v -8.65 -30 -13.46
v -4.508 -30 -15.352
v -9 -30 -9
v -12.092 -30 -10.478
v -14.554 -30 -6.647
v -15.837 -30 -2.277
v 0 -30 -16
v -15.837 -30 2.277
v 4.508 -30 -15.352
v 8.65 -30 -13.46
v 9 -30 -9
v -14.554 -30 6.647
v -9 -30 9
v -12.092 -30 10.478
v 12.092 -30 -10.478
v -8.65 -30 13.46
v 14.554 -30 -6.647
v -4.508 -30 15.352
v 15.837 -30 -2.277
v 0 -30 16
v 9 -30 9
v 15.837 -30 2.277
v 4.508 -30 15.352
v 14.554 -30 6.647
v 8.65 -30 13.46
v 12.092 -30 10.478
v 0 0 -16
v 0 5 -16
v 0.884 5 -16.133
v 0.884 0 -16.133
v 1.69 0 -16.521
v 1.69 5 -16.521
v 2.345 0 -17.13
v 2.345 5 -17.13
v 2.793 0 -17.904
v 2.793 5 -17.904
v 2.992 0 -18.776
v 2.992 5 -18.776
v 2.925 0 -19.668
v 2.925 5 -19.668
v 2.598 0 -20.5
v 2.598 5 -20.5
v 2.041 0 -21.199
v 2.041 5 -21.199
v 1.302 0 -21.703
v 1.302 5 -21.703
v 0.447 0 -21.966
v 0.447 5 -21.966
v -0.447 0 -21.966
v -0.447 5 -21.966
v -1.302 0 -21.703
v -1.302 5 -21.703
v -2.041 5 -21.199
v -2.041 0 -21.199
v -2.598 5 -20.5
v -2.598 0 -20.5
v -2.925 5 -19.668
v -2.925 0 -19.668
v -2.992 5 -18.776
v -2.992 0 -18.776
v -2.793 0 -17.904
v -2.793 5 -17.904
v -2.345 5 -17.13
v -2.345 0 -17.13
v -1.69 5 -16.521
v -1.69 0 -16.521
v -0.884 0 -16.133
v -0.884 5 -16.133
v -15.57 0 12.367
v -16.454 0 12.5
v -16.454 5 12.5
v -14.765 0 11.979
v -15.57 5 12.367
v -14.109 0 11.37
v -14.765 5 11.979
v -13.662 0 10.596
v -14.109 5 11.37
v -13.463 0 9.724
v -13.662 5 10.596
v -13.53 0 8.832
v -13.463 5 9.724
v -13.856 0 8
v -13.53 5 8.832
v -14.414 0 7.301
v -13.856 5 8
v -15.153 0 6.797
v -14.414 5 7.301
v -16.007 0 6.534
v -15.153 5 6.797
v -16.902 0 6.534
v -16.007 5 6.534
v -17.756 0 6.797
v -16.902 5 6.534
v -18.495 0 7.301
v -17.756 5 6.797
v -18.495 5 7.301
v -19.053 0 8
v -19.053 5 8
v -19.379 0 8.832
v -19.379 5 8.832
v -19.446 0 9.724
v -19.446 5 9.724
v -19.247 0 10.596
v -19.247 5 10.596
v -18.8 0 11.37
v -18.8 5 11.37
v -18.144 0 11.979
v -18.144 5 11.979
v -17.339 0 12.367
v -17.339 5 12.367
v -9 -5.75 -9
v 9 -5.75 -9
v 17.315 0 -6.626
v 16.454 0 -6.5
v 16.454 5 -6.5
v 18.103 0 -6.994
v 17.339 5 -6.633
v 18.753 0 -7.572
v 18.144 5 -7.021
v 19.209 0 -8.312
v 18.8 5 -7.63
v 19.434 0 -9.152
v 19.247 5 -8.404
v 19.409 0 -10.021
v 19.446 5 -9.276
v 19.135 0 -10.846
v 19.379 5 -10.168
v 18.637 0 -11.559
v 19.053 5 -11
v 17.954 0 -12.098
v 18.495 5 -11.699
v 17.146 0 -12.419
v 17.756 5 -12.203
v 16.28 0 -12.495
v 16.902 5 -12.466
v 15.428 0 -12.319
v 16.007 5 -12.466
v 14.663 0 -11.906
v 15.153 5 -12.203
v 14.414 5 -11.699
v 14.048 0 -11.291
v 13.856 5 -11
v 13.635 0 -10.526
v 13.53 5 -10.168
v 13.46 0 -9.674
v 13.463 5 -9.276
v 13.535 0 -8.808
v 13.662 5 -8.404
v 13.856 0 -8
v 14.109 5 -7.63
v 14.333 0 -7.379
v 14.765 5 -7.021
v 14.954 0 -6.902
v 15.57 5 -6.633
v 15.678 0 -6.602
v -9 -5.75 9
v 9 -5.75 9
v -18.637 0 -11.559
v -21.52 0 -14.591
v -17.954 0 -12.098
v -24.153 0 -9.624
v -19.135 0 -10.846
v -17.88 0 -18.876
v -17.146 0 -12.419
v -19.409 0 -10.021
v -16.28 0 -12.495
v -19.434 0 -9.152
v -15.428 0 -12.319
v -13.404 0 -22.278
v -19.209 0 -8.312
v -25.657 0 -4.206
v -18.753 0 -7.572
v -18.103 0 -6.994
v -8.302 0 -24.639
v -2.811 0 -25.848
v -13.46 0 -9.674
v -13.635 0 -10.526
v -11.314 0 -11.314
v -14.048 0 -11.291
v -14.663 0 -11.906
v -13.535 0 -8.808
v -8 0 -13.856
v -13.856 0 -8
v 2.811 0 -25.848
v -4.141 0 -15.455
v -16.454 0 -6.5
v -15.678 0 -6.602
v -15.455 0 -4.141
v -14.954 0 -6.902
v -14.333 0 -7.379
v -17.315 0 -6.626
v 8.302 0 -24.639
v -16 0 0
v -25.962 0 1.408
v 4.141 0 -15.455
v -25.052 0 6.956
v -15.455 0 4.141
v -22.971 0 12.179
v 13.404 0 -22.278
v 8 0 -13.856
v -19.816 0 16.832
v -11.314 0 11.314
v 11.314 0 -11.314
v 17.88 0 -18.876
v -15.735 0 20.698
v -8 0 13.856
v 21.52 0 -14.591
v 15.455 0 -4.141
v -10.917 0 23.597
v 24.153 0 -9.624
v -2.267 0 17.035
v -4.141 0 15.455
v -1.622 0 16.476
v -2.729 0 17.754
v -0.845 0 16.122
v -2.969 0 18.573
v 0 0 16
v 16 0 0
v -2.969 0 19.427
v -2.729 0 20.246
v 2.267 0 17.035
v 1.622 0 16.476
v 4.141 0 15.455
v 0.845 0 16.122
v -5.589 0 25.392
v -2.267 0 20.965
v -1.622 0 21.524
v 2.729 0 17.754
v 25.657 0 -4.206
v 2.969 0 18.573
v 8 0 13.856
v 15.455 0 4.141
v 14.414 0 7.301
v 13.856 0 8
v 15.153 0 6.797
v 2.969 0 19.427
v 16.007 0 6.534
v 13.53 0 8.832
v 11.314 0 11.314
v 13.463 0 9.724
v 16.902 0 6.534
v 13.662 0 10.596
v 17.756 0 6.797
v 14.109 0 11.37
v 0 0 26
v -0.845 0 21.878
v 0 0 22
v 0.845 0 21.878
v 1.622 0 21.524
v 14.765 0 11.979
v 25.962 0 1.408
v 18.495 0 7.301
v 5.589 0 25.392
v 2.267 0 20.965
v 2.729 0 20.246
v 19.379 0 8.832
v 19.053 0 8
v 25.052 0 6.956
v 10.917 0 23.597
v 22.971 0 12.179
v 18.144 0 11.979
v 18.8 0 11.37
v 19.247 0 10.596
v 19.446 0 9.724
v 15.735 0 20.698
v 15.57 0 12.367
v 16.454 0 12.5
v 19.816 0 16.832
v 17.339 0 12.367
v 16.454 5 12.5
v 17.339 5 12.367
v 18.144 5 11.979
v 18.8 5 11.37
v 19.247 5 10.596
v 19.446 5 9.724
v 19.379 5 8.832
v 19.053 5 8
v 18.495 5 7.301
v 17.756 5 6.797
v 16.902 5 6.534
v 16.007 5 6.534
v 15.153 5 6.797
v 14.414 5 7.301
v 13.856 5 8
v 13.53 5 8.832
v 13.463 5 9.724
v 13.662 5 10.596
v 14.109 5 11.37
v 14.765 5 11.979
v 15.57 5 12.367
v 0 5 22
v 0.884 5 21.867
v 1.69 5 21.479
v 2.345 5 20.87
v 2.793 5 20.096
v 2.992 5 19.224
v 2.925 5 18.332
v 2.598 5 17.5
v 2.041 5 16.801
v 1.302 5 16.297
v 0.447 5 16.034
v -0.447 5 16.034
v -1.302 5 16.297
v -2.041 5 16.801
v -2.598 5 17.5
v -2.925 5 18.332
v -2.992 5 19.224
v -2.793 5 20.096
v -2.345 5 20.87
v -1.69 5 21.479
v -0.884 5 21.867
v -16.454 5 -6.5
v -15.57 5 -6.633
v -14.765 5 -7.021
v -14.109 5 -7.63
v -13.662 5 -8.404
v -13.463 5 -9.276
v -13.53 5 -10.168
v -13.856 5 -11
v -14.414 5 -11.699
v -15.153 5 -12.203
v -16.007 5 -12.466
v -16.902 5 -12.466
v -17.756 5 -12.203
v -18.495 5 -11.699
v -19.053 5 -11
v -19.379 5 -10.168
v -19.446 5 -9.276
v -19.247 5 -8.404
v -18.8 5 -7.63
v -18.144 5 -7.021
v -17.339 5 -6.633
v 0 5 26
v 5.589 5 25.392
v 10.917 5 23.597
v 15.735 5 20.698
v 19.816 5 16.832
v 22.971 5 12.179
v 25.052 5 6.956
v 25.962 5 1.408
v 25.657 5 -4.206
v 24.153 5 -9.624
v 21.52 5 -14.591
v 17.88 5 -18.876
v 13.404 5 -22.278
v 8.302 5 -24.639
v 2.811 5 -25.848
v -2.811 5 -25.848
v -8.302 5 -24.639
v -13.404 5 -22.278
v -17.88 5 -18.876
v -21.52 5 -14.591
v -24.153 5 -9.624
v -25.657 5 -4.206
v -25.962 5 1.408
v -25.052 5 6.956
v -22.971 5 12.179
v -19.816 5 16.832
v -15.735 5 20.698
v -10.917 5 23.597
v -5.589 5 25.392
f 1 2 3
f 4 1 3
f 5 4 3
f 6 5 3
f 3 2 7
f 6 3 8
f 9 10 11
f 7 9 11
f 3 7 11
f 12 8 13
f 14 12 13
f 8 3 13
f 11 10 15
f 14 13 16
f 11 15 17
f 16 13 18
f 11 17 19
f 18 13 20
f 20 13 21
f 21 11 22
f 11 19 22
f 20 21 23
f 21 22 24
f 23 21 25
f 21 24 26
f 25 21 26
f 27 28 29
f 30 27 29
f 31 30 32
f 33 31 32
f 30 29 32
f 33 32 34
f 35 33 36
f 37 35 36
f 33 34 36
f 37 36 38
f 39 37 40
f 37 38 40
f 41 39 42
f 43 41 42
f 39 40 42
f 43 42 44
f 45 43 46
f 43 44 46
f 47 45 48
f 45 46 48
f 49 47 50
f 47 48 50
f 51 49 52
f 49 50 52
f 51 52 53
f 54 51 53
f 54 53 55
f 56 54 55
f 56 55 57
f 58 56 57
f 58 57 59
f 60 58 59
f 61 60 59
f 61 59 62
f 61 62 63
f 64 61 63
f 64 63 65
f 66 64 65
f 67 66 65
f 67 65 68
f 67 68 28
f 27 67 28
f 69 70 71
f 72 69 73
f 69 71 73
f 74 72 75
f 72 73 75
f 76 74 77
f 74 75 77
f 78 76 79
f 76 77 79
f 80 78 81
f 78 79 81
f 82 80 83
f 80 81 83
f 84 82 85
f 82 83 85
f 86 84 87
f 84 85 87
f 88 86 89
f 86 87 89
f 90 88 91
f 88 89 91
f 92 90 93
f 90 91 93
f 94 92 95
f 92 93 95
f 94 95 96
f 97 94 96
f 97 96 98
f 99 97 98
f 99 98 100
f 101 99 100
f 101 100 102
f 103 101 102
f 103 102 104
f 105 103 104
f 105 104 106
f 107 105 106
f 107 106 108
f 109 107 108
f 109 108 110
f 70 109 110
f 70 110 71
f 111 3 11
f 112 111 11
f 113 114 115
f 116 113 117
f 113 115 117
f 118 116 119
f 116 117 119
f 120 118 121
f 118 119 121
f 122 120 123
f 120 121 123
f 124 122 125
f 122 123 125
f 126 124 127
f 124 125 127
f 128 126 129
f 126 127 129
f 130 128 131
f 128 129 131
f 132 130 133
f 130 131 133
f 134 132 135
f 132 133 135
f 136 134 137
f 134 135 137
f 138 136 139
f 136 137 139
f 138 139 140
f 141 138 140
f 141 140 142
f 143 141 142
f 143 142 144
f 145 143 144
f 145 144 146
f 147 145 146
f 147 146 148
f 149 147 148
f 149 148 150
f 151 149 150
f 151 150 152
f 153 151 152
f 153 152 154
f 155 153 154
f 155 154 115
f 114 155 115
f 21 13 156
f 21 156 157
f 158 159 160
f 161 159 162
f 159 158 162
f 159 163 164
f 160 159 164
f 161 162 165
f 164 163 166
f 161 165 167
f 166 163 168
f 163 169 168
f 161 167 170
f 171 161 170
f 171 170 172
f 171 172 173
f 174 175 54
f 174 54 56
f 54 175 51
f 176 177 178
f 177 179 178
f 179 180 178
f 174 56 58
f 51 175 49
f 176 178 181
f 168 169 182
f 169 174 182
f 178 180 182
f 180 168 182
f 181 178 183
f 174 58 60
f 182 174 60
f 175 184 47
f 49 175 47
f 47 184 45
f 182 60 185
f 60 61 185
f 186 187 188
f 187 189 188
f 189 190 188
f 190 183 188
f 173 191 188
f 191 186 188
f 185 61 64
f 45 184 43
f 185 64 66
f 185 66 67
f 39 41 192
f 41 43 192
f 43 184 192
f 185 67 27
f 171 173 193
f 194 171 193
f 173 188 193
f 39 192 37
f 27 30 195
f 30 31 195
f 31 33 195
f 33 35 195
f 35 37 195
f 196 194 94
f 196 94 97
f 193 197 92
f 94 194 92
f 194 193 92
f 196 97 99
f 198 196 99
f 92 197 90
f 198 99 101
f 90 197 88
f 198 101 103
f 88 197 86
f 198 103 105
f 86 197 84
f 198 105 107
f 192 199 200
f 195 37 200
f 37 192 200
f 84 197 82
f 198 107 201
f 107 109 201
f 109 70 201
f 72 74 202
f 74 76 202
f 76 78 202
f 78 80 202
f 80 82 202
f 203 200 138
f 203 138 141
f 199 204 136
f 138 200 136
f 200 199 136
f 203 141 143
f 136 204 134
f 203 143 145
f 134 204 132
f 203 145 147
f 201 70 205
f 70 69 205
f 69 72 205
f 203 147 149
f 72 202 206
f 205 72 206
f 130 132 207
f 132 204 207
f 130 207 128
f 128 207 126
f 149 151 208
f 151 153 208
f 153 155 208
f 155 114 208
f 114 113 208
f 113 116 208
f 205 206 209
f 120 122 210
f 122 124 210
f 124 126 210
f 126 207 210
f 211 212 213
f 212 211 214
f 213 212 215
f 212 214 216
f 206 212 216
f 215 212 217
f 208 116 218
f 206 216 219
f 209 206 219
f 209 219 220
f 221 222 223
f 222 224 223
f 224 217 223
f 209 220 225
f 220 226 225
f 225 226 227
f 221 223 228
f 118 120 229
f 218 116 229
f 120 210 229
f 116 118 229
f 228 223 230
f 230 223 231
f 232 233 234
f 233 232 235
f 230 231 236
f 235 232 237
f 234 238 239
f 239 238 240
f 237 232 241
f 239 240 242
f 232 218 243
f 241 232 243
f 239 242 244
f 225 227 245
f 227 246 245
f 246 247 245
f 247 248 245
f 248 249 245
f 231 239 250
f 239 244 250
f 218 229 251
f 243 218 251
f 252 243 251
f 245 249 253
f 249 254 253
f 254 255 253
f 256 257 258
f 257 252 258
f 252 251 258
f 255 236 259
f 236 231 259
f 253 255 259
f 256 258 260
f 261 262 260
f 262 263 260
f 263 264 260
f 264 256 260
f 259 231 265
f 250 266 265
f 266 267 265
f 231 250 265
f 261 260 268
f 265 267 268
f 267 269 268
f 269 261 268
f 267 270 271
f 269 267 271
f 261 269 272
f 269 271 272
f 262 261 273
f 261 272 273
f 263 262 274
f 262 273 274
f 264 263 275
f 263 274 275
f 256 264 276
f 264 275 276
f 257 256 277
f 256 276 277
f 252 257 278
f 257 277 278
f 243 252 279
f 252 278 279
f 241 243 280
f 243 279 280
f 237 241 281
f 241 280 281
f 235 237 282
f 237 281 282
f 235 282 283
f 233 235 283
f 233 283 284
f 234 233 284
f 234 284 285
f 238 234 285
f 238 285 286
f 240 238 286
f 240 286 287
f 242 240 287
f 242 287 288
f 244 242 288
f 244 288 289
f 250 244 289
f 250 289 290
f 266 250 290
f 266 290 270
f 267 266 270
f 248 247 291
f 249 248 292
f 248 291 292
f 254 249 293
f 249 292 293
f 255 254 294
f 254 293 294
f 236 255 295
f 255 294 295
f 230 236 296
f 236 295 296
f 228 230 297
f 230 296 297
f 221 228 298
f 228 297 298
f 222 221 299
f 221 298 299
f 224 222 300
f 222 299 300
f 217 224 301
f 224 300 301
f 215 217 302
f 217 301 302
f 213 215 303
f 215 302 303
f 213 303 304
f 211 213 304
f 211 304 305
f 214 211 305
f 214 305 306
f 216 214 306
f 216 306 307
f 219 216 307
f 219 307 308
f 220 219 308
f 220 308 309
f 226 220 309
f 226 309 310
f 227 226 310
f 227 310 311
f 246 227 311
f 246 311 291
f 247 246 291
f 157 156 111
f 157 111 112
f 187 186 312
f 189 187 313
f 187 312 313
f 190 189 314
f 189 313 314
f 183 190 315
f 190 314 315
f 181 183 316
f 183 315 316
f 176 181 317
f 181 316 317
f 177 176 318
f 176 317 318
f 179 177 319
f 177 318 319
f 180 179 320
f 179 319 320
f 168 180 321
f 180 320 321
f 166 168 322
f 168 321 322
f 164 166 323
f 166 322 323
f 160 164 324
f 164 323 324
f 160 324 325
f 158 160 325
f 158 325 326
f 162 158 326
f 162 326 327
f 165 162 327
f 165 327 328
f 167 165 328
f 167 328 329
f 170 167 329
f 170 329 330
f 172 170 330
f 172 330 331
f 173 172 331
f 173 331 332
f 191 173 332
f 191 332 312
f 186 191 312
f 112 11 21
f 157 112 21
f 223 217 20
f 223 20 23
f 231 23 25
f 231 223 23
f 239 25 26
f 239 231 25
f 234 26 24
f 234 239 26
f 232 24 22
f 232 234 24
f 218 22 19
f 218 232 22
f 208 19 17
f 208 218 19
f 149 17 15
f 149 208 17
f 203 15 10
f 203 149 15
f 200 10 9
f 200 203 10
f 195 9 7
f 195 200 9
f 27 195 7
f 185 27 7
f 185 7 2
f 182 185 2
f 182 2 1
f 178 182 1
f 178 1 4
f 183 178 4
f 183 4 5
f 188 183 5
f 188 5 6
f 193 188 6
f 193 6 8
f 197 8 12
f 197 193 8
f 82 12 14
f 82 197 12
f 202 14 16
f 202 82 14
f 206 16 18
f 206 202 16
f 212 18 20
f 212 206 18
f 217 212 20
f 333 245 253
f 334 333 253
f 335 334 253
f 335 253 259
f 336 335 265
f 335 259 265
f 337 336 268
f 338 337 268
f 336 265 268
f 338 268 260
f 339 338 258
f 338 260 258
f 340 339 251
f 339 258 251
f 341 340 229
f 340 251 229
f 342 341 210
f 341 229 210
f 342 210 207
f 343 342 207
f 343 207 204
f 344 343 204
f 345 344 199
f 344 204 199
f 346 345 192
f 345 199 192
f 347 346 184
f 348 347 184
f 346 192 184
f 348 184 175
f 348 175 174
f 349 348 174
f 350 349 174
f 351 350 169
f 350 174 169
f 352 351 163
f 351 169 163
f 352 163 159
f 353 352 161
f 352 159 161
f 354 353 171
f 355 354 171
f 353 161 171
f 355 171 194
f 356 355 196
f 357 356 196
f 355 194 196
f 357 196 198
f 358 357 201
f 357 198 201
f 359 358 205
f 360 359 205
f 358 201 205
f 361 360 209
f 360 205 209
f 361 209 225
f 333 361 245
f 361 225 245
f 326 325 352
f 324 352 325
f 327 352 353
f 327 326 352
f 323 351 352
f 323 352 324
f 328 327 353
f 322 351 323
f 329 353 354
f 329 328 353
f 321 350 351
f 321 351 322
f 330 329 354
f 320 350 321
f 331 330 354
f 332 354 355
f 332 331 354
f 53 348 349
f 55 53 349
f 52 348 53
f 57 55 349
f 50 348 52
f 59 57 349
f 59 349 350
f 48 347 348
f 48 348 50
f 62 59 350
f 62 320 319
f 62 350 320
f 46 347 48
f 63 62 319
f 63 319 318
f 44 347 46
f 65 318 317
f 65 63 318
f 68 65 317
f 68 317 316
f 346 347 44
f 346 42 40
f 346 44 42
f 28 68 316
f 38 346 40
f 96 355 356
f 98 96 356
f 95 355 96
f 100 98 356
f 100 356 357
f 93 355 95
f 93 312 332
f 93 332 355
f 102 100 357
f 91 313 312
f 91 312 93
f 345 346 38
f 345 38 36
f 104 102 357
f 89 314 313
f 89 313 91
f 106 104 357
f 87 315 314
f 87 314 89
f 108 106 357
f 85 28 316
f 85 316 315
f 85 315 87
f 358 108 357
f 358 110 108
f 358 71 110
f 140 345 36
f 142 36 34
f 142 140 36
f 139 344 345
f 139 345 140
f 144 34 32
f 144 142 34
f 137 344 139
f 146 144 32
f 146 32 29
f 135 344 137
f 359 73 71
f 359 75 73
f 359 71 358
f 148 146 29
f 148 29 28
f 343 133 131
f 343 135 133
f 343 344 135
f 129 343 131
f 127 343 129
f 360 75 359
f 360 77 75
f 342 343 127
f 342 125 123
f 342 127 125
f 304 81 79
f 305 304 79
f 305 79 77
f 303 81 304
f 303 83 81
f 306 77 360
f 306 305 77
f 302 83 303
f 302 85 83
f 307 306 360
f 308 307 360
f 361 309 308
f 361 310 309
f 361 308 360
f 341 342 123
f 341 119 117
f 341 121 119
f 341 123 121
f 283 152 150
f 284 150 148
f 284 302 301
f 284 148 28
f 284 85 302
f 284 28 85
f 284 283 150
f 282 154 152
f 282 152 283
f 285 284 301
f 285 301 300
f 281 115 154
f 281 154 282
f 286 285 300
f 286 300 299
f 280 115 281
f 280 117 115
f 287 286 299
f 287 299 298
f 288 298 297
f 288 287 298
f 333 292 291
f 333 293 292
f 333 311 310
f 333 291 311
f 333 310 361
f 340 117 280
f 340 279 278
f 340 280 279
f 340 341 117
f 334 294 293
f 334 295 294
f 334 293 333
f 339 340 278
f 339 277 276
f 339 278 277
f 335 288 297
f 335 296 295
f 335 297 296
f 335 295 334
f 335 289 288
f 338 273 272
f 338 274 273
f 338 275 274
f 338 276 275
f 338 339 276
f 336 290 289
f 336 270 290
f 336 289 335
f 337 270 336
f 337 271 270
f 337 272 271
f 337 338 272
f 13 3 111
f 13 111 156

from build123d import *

# Parameters (mm, degrees)
SKETCH1_R           = 26
BOSS_EXTRUDE1_DEPTH = 5
SKETCH11_R          = 3
CUT_EXTRUDE7_DEPTH  = 38.107950631
BOSS_EXTRUDE4_START = -5
SKETCH4_R           = 16
BOSS_EXTRUDE4_DEPTH = 30
SKETCH10_W          = 18
SKETCH10_H          = 18
CUT_EXTRUDE8_DEPTH  = 24.25


with BuildPart() as part:
    # Sketch1 → Boss-Extrude1 (new body)
    with BuildSketch(Plane(origin=(0, 0, 0), x_dir=(1, 0, 0), z_dir=(0, 1, 0))):
        with Locations(Location((0, 0, 0), (0, 0, 270))):
            Circle(SKETCH1_R)
    extrude(amount=BOSS_EXTRUDE1_DEPTH)

    # Sketch11 → Cut-Extrude7 (cut, through all)
    with BuildSketch(Plane(origin=(0, 5, 0), x_dir=(1, 0, 0), z_dir=(0, 1, 0))):
        with Locations(Location((-16.454482672, -9.5, 0), (0, 0, 270))):
            Circle(SKETCH11_R)
        with Locations(Location((-16.454482672, 9.5, 0), (0, 0, 270))):
            Circle(SKETCH11_R)
        with Locations(Location((0, 19, 0), (0, 0, 270))):
            Circle(SKETCH11_R)
        with Locations(Location((16.454482672, 9.5, 0), (0, 0, 270))):
            Circle(SKETCH11_R)
        with Locations(Location((16.454482672, -9.5, 0), (0, 0, 270))):
            Circle(SKETCH11_R)
        with Locations(Location((0, -19, 0), (0, 0, 270))):
            Circle(SKETCH11_R)
    extrude(amount=-CUT_EXTRUDE7_DEPTH, mode=Mode.SUBTRACT)

    # Sketch4 → Boss-Extrude4 (add)
    with BuildSketch(Plane(origin=(0, 5, 0), x_dir=(1, 0, 0), z_dir=(0, 1, 0)).offset(BOSS_EXTRUDE4_START)):
        with Locations(Location((0, 0, 0), (0, 0, 270))):
            Circle(SKETCH4_R)
    extrude(amount=-BOSS_EXTRUDE4_DEPTH)

    # Sketch10 → Cut-Extrude8 (cut)
    with BuildSketch(Plane.XZ.offset(30)):
        Rectangle(SKETCH10_W, SKETCH10_H)
    extrude(amount=-CUT_EXTRUDE8_DEPTH, mode=Mode.SUBTRACT)


solid = part.part
